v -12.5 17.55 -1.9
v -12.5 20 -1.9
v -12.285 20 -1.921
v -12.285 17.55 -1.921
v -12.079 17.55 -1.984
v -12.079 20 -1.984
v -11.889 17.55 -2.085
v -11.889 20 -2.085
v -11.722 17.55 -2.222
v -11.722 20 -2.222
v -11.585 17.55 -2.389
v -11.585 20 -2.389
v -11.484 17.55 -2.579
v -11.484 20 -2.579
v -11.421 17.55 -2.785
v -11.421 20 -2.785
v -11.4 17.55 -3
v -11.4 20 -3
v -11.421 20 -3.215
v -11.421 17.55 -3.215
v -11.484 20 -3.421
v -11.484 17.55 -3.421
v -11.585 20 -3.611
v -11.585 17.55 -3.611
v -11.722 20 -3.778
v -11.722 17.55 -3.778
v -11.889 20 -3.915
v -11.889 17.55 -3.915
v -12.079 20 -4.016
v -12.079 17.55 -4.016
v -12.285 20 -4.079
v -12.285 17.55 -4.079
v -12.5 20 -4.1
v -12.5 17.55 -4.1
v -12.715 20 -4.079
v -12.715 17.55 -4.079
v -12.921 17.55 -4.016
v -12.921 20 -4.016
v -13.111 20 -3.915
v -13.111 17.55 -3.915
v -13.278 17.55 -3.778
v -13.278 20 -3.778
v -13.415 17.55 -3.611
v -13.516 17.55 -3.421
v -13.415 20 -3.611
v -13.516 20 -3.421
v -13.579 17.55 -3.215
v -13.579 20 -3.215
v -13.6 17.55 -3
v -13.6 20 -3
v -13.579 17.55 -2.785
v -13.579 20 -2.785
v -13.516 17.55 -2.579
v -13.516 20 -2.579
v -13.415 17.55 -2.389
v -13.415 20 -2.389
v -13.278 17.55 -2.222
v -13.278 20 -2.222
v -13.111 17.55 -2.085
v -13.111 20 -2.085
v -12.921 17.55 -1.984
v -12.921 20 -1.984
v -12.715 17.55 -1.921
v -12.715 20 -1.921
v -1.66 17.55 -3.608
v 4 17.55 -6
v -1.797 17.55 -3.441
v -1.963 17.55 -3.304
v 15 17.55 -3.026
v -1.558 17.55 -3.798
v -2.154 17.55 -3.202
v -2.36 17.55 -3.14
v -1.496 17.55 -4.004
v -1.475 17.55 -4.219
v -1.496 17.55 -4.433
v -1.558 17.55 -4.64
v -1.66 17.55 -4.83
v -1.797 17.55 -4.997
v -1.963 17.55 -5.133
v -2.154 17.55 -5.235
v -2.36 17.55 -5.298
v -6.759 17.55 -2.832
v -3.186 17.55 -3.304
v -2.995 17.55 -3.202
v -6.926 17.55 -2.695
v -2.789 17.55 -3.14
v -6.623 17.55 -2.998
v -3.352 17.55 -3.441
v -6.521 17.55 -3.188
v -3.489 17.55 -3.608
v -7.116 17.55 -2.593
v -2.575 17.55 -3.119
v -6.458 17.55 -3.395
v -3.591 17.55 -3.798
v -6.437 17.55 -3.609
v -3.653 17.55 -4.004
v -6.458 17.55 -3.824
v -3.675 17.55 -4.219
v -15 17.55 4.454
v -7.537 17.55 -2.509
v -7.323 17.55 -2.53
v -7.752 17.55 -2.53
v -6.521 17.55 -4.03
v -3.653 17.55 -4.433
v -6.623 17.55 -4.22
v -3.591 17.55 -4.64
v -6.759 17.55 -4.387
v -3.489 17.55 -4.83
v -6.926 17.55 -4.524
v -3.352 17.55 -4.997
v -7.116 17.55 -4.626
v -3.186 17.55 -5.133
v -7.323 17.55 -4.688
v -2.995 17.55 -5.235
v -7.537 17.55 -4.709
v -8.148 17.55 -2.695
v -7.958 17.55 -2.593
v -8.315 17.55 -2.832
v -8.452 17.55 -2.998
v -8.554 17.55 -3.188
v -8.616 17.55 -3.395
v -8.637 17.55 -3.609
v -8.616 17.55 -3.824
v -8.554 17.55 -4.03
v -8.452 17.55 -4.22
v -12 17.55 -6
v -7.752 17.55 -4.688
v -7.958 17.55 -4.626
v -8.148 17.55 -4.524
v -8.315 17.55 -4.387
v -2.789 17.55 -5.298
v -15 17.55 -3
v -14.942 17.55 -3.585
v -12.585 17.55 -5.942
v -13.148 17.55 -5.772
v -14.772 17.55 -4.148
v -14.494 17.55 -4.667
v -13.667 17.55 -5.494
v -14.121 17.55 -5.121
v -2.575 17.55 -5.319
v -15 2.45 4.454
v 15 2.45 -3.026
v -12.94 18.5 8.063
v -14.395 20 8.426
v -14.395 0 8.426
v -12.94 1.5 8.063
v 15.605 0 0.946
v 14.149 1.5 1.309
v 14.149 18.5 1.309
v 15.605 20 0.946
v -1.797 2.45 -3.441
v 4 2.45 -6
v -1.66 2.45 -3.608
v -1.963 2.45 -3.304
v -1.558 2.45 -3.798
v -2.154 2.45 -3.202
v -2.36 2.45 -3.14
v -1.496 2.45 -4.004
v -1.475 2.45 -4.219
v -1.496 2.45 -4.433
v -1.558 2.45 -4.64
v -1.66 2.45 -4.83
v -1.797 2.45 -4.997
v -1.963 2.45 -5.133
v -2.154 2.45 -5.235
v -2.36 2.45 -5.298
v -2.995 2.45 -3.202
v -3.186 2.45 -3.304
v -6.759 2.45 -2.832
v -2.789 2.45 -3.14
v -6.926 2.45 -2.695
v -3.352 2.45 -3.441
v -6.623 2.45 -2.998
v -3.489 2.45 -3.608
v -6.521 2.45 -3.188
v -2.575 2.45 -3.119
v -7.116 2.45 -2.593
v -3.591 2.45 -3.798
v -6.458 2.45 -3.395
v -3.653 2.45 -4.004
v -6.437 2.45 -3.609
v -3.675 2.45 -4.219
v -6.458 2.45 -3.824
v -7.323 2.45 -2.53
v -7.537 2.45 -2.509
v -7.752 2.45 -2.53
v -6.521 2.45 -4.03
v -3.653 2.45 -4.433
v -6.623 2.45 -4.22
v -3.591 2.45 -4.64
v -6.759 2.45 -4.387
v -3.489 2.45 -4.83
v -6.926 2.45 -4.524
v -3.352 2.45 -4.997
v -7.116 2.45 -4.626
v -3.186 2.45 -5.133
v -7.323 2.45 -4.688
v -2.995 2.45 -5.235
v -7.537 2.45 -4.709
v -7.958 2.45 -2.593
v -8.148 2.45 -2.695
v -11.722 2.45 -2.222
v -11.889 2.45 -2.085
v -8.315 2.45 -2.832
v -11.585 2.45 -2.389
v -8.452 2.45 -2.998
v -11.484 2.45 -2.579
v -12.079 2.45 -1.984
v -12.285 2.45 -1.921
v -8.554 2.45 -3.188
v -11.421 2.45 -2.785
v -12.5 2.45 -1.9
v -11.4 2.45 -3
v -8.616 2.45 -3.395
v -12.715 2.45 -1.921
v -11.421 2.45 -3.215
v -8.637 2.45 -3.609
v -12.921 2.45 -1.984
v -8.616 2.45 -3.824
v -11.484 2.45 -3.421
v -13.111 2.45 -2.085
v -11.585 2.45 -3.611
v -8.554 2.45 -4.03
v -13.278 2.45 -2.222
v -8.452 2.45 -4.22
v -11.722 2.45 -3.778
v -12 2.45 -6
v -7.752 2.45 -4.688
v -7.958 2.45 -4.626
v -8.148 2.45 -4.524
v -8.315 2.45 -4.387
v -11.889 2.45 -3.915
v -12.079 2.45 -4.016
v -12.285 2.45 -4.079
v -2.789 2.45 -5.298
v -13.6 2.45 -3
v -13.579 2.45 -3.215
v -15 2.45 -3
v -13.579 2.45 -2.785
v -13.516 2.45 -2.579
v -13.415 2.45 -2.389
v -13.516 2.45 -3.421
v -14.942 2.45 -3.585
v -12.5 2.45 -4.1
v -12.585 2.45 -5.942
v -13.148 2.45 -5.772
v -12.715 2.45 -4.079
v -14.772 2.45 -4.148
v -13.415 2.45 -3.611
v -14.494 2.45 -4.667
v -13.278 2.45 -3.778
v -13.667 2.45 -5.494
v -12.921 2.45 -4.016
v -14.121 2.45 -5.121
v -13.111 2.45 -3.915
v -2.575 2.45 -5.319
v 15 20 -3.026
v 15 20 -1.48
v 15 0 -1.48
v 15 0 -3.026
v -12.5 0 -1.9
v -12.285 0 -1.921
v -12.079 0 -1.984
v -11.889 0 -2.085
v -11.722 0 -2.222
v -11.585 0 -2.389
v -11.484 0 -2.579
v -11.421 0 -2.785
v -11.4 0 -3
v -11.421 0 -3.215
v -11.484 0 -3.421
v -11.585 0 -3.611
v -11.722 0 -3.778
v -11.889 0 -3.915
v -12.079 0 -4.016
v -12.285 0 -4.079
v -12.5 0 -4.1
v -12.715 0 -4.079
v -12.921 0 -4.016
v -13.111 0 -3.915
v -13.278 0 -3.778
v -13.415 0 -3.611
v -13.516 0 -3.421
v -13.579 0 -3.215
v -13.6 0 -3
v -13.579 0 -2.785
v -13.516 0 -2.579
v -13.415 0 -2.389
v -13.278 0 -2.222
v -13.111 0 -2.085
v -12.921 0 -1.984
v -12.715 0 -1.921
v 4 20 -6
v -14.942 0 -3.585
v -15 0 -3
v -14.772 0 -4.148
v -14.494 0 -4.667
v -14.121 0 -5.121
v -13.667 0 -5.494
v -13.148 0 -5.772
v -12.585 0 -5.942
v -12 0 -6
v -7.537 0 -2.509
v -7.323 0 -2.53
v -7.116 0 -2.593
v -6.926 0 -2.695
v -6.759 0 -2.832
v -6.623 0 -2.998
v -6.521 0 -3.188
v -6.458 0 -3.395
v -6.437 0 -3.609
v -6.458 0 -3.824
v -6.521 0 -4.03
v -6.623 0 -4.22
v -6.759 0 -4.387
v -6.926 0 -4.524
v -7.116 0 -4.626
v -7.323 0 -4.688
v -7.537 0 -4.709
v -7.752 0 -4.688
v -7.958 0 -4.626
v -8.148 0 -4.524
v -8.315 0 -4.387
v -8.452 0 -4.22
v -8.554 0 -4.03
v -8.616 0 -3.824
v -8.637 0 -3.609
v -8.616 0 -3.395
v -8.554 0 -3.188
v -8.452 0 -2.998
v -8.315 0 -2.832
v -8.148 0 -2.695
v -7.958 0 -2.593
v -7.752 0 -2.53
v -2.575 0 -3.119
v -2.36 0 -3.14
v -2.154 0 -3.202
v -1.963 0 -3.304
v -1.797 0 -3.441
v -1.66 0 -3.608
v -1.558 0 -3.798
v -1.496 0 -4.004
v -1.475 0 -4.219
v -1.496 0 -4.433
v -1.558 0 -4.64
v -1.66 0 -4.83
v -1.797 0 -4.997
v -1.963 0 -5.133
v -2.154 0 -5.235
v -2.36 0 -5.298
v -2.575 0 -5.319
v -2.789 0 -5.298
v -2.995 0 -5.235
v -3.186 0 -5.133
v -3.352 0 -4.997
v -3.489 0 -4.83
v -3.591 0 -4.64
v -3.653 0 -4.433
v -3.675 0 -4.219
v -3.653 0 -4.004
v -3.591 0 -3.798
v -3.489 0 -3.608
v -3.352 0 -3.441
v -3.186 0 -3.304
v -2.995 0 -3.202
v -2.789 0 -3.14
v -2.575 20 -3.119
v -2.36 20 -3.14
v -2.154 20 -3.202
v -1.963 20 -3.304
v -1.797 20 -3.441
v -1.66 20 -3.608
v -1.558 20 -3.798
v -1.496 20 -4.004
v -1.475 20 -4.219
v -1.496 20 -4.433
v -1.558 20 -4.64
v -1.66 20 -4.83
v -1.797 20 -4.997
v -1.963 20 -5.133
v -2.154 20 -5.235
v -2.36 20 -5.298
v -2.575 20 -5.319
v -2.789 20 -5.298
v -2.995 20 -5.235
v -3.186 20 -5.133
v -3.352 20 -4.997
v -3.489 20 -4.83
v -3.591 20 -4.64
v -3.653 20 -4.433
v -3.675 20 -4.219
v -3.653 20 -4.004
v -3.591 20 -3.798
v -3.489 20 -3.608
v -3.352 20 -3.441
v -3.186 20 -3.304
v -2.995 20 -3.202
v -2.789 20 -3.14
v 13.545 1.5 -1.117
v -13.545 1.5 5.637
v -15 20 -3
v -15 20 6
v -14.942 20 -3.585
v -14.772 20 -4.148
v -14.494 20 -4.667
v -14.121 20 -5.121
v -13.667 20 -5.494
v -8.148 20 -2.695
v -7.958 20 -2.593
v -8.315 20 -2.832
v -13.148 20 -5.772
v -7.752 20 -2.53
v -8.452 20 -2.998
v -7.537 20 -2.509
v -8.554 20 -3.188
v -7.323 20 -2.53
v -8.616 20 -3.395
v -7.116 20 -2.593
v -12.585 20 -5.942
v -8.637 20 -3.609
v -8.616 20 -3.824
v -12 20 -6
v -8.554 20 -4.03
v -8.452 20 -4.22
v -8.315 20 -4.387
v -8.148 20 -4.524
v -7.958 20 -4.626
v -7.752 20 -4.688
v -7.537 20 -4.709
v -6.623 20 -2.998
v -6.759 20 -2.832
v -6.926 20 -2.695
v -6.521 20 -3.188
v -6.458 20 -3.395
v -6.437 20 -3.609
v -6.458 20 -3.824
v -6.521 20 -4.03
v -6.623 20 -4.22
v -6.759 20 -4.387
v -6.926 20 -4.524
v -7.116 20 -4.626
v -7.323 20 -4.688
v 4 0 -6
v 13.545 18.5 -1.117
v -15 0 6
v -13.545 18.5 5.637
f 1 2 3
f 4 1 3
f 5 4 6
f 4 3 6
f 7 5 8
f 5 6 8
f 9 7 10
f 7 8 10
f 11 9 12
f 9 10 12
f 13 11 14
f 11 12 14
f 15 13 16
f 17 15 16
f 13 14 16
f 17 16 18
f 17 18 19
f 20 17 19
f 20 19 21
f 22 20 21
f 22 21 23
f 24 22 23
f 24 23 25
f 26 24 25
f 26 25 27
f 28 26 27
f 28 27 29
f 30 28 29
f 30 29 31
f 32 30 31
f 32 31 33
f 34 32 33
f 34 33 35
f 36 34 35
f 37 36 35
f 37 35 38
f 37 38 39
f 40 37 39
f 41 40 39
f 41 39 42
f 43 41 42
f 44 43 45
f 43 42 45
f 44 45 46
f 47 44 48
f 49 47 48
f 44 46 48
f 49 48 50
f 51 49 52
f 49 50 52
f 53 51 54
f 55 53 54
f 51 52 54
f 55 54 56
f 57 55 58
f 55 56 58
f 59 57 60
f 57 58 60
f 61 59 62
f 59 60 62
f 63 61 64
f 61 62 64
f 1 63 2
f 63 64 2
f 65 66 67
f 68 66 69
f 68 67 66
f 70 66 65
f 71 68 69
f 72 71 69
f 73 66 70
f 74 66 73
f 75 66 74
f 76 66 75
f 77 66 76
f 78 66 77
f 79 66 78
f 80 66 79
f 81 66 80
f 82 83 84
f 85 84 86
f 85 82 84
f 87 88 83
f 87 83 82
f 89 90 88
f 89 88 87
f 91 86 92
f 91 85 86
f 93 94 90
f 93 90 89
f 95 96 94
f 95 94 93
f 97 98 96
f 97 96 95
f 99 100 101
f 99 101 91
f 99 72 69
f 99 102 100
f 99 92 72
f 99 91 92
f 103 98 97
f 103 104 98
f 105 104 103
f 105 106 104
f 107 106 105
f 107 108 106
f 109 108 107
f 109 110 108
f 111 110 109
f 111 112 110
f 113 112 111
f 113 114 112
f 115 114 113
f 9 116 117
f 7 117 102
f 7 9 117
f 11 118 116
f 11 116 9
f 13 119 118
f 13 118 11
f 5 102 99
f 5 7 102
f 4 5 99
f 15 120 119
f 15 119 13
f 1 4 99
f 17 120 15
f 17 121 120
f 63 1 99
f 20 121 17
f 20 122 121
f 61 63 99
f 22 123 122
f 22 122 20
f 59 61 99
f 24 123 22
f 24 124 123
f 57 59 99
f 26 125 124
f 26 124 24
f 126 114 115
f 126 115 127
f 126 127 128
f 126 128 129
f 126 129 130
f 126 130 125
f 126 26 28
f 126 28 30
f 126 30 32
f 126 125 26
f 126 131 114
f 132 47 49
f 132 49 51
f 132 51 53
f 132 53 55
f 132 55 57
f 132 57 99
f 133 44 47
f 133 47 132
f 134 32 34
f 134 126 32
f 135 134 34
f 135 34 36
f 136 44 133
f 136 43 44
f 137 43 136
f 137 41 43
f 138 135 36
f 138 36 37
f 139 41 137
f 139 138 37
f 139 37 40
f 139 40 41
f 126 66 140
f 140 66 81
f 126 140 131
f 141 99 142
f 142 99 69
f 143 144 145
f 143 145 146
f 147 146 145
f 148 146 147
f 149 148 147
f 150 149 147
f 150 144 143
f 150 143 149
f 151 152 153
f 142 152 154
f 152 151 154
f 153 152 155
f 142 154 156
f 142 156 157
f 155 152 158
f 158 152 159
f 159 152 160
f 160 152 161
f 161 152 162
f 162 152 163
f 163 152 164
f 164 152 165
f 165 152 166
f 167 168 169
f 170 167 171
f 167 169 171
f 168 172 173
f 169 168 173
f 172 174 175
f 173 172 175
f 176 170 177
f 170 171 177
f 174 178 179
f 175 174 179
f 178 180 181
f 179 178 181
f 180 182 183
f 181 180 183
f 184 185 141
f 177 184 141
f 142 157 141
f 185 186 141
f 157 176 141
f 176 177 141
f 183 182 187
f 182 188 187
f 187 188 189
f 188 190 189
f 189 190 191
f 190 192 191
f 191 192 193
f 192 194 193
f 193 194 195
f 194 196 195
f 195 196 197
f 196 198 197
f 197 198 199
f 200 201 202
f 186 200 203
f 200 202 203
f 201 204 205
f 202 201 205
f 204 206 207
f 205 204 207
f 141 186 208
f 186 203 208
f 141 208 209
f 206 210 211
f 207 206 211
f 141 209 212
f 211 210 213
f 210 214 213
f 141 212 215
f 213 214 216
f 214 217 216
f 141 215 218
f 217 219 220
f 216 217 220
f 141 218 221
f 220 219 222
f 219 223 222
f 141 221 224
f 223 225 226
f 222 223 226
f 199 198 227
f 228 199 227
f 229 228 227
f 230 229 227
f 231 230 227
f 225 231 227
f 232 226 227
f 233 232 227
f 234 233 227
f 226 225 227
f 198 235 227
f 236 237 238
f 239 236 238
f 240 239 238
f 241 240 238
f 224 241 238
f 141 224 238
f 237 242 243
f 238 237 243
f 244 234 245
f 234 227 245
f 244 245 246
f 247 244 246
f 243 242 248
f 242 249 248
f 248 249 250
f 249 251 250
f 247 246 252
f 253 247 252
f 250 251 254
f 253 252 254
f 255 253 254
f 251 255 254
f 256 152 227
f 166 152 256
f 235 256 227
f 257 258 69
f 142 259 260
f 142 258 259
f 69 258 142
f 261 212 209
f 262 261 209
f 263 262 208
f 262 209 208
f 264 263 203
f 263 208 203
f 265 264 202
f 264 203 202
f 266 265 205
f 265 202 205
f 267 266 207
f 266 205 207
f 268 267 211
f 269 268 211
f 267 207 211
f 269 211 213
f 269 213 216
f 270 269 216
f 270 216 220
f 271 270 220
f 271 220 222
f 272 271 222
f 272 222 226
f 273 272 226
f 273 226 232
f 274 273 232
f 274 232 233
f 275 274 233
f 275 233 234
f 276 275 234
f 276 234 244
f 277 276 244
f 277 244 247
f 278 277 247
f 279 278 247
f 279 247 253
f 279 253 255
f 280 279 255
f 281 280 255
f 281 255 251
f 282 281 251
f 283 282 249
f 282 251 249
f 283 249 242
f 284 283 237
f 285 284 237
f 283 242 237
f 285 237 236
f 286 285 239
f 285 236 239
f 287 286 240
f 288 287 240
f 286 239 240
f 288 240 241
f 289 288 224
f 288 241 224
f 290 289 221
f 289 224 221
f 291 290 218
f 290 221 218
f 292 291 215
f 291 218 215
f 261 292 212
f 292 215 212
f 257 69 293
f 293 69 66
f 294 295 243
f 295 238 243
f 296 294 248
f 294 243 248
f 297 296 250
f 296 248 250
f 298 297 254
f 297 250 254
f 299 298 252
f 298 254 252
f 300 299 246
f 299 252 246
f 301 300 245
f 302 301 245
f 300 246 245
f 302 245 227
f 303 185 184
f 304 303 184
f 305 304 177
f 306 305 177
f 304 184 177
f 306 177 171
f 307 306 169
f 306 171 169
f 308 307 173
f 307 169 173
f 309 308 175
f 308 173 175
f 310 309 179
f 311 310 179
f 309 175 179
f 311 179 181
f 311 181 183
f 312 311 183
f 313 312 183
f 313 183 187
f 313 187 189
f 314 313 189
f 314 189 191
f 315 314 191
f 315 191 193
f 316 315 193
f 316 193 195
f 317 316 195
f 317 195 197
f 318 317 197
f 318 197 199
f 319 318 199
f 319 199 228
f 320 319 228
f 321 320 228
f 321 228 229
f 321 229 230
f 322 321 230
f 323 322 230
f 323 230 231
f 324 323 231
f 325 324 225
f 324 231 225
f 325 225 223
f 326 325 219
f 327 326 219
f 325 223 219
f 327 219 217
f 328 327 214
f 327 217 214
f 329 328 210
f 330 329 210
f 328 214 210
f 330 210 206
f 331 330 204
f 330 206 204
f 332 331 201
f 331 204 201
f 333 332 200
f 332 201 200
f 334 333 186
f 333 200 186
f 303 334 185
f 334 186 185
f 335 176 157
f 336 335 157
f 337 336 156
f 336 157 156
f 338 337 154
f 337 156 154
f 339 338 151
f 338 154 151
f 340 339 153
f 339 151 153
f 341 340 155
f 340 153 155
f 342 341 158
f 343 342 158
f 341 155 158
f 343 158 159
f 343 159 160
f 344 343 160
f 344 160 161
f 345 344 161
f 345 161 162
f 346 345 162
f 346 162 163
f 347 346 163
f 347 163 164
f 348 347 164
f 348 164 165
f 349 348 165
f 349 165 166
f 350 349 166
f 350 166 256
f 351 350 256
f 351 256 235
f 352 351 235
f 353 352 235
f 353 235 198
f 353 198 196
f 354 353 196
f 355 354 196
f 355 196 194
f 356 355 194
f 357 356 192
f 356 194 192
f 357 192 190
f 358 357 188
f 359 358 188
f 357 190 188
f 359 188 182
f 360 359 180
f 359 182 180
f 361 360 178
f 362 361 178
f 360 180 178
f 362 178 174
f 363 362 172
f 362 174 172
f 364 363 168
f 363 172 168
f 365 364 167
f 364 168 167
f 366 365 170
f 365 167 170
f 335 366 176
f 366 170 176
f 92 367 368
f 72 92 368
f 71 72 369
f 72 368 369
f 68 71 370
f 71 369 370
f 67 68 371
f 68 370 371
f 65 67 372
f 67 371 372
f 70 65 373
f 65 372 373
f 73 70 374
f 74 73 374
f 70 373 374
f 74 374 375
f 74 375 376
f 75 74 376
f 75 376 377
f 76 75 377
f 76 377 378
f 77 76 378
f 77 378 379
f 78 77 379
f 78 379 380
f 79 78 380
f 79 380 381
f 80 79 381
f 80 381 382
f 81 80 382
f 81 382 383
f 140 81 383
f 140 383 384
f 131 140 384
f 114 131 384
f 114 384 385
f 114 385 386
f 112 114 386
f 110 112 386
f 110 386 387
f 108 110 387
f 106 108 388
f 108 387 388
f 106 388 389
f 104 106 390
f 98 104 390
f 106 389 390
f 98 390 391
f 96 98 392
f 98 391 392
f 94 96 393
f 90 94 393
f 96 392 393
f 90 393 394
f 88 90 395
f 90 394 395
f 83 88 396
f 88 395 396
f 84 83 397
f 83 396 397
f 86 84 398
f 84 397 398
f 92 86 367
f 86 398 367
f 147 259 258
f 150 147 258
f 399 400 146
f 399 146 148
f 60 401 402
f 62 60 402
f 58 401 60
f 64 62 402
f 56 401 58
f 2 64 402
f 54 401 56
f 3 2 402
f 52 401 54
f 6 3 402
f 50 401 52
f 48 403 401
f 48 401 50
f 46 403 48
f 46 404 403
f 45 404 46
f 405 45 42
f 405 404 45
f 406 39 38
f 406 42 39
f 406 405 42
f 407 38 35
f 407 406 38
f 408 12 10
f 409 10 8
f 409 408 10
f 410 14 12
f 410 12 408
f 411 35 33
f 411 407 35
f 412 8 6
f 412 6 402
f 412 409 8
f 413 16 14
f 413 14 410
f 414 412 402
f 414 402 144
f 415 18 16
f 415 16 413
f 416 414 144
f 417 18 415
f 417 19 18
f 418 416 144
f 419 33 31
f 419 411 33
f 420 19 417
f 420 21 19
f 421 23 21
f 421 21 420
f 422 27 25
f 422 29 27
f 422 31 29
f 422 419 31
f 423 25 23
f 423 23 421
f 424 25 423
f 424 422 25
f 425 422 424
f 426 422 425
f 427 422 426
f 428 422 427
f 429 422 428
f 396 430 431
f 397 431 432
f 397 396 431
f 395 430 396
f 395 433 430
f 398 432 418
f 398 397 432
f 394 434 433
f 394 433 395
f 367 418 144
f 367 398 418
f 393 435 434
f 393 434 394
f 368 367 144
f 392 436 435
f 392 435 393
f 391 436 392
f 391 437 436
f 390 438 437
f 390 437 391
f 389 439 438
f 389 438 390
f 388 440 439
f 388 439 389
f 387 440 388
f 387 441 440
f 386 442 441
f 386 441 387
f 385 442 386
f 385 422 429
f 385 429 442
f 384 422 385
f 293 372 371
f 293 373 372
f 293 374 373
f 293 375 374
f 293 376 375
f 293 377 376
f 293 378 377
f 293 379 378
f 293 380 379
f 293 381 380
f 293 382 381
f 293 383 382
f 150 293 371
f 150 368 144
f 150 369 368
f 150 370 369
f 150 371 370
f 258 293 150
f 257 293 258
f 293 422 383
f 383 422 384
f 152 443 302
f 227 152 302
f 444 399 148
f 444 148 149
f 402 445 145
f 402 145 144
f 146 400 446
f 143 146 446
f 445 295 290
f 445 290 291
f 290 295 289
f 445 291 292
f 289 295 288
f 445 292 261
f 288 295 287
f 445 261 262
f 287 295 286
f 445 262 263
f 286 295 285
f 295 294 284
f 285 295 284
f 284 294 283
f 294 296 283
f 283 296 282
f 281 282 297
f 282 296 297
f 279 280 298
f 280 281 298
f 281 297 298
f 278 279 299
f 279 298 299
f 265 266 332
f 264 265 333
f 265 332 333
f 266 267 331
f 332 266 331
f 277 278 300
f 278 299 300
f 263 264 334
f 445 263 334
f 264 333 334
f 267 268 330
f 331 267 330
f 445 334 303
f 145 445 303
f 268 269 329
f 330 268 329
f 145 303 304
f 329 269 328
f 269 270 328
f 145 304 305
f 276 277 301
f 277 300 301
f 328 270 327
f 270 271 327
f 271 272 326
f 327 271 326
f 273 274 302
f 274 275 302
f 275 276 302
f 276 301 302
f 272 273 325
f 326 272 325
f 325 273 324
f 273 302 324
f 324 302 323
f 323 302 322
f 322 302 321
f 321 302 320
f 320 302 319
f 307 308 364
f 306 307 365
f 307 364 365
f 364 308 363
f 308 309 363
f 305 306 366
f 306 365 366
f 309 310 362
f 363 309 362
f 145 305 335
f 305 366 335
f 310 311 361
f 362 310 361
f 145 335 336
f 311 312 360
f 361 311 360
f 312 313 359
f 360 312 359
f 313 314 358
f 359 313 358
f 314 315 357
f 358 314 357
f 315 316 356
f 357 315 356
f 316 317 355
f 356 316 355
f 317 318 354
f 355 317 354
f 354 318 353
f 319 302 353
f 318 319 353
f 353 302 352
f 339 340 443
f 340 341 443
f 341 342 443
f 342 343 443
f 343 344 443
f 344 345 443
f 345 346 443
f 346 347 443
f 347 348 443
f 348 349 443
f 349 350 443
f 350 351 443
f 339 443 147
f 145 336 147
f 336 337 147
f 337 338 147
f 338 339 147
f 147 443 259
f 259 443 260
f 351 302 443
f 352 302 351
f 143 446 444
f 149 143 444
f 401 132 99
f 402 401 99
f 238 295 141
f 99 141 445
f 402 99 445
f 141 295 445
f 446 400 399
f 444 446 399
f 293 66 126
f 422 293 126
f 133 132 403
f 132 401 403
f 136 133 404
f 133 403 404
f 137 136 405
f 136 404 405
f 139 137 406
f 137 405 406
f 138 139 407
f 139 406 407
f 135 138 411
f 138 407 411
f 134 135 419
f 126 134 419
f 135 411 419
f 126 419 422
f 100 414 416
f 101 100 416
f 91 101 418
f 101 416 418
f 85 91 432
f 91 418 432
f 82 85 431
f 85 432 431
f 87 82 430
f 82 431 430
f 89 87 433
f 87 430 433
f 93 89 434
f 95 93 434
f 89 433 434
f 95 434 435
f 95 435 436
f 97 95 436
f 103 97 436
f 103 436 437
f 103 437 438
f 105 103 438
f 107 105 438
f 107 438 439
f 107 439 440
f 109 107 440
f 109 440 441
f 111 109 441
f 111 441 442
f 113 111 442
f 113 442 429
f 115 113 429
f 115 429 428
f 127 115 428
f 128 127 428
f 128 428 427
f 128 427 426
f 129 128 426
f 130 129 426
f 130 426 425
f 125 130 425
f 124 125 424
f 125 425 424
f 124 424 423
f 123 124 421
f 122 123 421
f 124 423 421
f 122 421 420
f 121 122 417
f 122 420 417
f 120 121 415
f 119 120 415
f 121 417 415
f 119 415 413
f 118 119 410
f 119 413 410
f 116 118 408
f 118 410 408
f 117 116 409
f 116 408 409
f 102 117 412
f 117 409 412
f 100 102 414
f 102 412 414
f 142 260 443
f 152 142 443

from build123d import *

# Parameters (mm, degrees)
EXTRUDE_1_DEPTH          = 20
SKETCH_2_R               = 1.1
CUT_EXTRUDE_2_DEPTH      = 26.709920264
CUT_EXTRUDE_3_REACH      = 29.731
SKETCH_3_W               = 30
SKETCH_3_H               = 15.1
FILLET_1_R               = 3
SKETCH_6_W               = 30.918408881
SKETCH_6_H               = 20
SKETCH_6_W_2             = 27.918408881
SKETCH_6_H_2             = 17
EXTRUDE_2_DEPTH          = 2.5
CUT_EXTRUDE_4_DEPTH      = 25.9500604
CUT_EXTRUDE_4_DEPTH_BACK = 25.9500604


with BuildPart() as part:
    # 草图1 → 凸台-拉伸1 (new body)
    with BuildSketch(Plane(origin=(0, 0, 0), x_dir=(1, 0, 0), z_dir=(0, 1, 0))):
        Polygon((-15, -6), (15, 1.479840085), (15, 6), (-15, 6), align=None)
    extrude(amount=EXTRUDE_1_DEPTH)

    # 草图2 → 切除-拉伸2 (cut, through all)
    with BuildSketch(Plane(origin=(0, 20, 0), x_dir=(1, 0, 0), z_dir=(0, 1, 0))):
        with Locations(Location((-12.5, 3, 0), (0, 0, 270))):
            Circle(SKETCH_2_R)
        with Locations(Location((-7.537269242, 3.609346717, 0), (0, 0, 270))):
            Circle(SKETCH_2_R)
        with Locations(Location((-2.574538484, 4.218693434, 0), (0, 0, 270))):
            Circle(SKETCH_2_R)
    extrude(amount=-CUT_EXTRUDE_2_DEPTH, mode=Mode.SUBTRACT)

    # 切除-拉伸3: up to this plane
    cut_extrude_3_end = Plane(origin=(0.167638791, 0, 0.672362468), z_dir=(0.24192189559966876, 0, 0.9702957262759963))
    # 草图3 → 切除-拉伸3 (cut, up to the surface)
    with BuildSketch(Plane(origin=(0, 0, -6), x_dir=(-1, 0, 0), z_dir=(0, 0, -1)), mode=Mode.PRIVATE) as cut_extrude_3_sk1:
        with Locations((0, 10)):
            Rectangle(SKETCH_3_W, SKETCH_3_H)
    cut_extrude_3_tool1 = split(extrude(cut_extrude_3_sk1.sketch, amount=-CUT_EXTRUDE_3_REACH, mode=Mode.PRIVATE), bisect_by=cut_extrude_3_end, keep=Keep.BOTH, mode=Mode.PRIVATE)
    add(cut_extrude_3_tool1.solids().sort_by_distance((0, 10, -6))[0], mode=Mode.SUBTRACT)

    # 圆角1
    fillet_1_edges = [part.edges().sort_by_distance(p)[0] for p in [
        (-15, 1.225, -6),
        (-15, 18.775, -6),
    ]]
    fillet(fillet_1_edges, radius=FILLET_1_R)

    # 草图6 → 凸台-拉伸2 (add)
    with BuildSketch(Plane(origin=(0.530521635, 0, 2.127806058), x_dir=(0.9702957262759964, 0, -0.2419218955996687), z_dir=(0.2419218955996687, 0, 0.9702957262759964))):
        with Locations((-0.546762828, 10)):
            Rectangle(SKETCH_6_W, SKETCH_6_H)
        with Locations((-0.546762828, 10)):
            Rectangle(SKETCH_6_W_2, SKETCH_6_H_2, mode=Mode.SUBTRACT)
    extrude(amount=EXTRUDE_2_DEPTH)

    # 草图7 → 切除-拉伸4 (cut, two sides: drawn at the far end of the back side and taken through both)
    with BuildSketch(Plane(origin=(0, 2.45, 0), x_dir=(1, 0, 0), z_dir=(0, 1, 0)).offset(-CUT_EXTRUDE_4_DEPTH_BACK)):
        Polygon((15, 3.025760529), (4, 6), (15, 6), align=None)
    extrude(amount=CUT_EXTRUDE_4_DEPTH + CUT_EXTRUDE_4_DEPTH_BACK, mode=Mode.SUBTRACT)


solid = part.part
